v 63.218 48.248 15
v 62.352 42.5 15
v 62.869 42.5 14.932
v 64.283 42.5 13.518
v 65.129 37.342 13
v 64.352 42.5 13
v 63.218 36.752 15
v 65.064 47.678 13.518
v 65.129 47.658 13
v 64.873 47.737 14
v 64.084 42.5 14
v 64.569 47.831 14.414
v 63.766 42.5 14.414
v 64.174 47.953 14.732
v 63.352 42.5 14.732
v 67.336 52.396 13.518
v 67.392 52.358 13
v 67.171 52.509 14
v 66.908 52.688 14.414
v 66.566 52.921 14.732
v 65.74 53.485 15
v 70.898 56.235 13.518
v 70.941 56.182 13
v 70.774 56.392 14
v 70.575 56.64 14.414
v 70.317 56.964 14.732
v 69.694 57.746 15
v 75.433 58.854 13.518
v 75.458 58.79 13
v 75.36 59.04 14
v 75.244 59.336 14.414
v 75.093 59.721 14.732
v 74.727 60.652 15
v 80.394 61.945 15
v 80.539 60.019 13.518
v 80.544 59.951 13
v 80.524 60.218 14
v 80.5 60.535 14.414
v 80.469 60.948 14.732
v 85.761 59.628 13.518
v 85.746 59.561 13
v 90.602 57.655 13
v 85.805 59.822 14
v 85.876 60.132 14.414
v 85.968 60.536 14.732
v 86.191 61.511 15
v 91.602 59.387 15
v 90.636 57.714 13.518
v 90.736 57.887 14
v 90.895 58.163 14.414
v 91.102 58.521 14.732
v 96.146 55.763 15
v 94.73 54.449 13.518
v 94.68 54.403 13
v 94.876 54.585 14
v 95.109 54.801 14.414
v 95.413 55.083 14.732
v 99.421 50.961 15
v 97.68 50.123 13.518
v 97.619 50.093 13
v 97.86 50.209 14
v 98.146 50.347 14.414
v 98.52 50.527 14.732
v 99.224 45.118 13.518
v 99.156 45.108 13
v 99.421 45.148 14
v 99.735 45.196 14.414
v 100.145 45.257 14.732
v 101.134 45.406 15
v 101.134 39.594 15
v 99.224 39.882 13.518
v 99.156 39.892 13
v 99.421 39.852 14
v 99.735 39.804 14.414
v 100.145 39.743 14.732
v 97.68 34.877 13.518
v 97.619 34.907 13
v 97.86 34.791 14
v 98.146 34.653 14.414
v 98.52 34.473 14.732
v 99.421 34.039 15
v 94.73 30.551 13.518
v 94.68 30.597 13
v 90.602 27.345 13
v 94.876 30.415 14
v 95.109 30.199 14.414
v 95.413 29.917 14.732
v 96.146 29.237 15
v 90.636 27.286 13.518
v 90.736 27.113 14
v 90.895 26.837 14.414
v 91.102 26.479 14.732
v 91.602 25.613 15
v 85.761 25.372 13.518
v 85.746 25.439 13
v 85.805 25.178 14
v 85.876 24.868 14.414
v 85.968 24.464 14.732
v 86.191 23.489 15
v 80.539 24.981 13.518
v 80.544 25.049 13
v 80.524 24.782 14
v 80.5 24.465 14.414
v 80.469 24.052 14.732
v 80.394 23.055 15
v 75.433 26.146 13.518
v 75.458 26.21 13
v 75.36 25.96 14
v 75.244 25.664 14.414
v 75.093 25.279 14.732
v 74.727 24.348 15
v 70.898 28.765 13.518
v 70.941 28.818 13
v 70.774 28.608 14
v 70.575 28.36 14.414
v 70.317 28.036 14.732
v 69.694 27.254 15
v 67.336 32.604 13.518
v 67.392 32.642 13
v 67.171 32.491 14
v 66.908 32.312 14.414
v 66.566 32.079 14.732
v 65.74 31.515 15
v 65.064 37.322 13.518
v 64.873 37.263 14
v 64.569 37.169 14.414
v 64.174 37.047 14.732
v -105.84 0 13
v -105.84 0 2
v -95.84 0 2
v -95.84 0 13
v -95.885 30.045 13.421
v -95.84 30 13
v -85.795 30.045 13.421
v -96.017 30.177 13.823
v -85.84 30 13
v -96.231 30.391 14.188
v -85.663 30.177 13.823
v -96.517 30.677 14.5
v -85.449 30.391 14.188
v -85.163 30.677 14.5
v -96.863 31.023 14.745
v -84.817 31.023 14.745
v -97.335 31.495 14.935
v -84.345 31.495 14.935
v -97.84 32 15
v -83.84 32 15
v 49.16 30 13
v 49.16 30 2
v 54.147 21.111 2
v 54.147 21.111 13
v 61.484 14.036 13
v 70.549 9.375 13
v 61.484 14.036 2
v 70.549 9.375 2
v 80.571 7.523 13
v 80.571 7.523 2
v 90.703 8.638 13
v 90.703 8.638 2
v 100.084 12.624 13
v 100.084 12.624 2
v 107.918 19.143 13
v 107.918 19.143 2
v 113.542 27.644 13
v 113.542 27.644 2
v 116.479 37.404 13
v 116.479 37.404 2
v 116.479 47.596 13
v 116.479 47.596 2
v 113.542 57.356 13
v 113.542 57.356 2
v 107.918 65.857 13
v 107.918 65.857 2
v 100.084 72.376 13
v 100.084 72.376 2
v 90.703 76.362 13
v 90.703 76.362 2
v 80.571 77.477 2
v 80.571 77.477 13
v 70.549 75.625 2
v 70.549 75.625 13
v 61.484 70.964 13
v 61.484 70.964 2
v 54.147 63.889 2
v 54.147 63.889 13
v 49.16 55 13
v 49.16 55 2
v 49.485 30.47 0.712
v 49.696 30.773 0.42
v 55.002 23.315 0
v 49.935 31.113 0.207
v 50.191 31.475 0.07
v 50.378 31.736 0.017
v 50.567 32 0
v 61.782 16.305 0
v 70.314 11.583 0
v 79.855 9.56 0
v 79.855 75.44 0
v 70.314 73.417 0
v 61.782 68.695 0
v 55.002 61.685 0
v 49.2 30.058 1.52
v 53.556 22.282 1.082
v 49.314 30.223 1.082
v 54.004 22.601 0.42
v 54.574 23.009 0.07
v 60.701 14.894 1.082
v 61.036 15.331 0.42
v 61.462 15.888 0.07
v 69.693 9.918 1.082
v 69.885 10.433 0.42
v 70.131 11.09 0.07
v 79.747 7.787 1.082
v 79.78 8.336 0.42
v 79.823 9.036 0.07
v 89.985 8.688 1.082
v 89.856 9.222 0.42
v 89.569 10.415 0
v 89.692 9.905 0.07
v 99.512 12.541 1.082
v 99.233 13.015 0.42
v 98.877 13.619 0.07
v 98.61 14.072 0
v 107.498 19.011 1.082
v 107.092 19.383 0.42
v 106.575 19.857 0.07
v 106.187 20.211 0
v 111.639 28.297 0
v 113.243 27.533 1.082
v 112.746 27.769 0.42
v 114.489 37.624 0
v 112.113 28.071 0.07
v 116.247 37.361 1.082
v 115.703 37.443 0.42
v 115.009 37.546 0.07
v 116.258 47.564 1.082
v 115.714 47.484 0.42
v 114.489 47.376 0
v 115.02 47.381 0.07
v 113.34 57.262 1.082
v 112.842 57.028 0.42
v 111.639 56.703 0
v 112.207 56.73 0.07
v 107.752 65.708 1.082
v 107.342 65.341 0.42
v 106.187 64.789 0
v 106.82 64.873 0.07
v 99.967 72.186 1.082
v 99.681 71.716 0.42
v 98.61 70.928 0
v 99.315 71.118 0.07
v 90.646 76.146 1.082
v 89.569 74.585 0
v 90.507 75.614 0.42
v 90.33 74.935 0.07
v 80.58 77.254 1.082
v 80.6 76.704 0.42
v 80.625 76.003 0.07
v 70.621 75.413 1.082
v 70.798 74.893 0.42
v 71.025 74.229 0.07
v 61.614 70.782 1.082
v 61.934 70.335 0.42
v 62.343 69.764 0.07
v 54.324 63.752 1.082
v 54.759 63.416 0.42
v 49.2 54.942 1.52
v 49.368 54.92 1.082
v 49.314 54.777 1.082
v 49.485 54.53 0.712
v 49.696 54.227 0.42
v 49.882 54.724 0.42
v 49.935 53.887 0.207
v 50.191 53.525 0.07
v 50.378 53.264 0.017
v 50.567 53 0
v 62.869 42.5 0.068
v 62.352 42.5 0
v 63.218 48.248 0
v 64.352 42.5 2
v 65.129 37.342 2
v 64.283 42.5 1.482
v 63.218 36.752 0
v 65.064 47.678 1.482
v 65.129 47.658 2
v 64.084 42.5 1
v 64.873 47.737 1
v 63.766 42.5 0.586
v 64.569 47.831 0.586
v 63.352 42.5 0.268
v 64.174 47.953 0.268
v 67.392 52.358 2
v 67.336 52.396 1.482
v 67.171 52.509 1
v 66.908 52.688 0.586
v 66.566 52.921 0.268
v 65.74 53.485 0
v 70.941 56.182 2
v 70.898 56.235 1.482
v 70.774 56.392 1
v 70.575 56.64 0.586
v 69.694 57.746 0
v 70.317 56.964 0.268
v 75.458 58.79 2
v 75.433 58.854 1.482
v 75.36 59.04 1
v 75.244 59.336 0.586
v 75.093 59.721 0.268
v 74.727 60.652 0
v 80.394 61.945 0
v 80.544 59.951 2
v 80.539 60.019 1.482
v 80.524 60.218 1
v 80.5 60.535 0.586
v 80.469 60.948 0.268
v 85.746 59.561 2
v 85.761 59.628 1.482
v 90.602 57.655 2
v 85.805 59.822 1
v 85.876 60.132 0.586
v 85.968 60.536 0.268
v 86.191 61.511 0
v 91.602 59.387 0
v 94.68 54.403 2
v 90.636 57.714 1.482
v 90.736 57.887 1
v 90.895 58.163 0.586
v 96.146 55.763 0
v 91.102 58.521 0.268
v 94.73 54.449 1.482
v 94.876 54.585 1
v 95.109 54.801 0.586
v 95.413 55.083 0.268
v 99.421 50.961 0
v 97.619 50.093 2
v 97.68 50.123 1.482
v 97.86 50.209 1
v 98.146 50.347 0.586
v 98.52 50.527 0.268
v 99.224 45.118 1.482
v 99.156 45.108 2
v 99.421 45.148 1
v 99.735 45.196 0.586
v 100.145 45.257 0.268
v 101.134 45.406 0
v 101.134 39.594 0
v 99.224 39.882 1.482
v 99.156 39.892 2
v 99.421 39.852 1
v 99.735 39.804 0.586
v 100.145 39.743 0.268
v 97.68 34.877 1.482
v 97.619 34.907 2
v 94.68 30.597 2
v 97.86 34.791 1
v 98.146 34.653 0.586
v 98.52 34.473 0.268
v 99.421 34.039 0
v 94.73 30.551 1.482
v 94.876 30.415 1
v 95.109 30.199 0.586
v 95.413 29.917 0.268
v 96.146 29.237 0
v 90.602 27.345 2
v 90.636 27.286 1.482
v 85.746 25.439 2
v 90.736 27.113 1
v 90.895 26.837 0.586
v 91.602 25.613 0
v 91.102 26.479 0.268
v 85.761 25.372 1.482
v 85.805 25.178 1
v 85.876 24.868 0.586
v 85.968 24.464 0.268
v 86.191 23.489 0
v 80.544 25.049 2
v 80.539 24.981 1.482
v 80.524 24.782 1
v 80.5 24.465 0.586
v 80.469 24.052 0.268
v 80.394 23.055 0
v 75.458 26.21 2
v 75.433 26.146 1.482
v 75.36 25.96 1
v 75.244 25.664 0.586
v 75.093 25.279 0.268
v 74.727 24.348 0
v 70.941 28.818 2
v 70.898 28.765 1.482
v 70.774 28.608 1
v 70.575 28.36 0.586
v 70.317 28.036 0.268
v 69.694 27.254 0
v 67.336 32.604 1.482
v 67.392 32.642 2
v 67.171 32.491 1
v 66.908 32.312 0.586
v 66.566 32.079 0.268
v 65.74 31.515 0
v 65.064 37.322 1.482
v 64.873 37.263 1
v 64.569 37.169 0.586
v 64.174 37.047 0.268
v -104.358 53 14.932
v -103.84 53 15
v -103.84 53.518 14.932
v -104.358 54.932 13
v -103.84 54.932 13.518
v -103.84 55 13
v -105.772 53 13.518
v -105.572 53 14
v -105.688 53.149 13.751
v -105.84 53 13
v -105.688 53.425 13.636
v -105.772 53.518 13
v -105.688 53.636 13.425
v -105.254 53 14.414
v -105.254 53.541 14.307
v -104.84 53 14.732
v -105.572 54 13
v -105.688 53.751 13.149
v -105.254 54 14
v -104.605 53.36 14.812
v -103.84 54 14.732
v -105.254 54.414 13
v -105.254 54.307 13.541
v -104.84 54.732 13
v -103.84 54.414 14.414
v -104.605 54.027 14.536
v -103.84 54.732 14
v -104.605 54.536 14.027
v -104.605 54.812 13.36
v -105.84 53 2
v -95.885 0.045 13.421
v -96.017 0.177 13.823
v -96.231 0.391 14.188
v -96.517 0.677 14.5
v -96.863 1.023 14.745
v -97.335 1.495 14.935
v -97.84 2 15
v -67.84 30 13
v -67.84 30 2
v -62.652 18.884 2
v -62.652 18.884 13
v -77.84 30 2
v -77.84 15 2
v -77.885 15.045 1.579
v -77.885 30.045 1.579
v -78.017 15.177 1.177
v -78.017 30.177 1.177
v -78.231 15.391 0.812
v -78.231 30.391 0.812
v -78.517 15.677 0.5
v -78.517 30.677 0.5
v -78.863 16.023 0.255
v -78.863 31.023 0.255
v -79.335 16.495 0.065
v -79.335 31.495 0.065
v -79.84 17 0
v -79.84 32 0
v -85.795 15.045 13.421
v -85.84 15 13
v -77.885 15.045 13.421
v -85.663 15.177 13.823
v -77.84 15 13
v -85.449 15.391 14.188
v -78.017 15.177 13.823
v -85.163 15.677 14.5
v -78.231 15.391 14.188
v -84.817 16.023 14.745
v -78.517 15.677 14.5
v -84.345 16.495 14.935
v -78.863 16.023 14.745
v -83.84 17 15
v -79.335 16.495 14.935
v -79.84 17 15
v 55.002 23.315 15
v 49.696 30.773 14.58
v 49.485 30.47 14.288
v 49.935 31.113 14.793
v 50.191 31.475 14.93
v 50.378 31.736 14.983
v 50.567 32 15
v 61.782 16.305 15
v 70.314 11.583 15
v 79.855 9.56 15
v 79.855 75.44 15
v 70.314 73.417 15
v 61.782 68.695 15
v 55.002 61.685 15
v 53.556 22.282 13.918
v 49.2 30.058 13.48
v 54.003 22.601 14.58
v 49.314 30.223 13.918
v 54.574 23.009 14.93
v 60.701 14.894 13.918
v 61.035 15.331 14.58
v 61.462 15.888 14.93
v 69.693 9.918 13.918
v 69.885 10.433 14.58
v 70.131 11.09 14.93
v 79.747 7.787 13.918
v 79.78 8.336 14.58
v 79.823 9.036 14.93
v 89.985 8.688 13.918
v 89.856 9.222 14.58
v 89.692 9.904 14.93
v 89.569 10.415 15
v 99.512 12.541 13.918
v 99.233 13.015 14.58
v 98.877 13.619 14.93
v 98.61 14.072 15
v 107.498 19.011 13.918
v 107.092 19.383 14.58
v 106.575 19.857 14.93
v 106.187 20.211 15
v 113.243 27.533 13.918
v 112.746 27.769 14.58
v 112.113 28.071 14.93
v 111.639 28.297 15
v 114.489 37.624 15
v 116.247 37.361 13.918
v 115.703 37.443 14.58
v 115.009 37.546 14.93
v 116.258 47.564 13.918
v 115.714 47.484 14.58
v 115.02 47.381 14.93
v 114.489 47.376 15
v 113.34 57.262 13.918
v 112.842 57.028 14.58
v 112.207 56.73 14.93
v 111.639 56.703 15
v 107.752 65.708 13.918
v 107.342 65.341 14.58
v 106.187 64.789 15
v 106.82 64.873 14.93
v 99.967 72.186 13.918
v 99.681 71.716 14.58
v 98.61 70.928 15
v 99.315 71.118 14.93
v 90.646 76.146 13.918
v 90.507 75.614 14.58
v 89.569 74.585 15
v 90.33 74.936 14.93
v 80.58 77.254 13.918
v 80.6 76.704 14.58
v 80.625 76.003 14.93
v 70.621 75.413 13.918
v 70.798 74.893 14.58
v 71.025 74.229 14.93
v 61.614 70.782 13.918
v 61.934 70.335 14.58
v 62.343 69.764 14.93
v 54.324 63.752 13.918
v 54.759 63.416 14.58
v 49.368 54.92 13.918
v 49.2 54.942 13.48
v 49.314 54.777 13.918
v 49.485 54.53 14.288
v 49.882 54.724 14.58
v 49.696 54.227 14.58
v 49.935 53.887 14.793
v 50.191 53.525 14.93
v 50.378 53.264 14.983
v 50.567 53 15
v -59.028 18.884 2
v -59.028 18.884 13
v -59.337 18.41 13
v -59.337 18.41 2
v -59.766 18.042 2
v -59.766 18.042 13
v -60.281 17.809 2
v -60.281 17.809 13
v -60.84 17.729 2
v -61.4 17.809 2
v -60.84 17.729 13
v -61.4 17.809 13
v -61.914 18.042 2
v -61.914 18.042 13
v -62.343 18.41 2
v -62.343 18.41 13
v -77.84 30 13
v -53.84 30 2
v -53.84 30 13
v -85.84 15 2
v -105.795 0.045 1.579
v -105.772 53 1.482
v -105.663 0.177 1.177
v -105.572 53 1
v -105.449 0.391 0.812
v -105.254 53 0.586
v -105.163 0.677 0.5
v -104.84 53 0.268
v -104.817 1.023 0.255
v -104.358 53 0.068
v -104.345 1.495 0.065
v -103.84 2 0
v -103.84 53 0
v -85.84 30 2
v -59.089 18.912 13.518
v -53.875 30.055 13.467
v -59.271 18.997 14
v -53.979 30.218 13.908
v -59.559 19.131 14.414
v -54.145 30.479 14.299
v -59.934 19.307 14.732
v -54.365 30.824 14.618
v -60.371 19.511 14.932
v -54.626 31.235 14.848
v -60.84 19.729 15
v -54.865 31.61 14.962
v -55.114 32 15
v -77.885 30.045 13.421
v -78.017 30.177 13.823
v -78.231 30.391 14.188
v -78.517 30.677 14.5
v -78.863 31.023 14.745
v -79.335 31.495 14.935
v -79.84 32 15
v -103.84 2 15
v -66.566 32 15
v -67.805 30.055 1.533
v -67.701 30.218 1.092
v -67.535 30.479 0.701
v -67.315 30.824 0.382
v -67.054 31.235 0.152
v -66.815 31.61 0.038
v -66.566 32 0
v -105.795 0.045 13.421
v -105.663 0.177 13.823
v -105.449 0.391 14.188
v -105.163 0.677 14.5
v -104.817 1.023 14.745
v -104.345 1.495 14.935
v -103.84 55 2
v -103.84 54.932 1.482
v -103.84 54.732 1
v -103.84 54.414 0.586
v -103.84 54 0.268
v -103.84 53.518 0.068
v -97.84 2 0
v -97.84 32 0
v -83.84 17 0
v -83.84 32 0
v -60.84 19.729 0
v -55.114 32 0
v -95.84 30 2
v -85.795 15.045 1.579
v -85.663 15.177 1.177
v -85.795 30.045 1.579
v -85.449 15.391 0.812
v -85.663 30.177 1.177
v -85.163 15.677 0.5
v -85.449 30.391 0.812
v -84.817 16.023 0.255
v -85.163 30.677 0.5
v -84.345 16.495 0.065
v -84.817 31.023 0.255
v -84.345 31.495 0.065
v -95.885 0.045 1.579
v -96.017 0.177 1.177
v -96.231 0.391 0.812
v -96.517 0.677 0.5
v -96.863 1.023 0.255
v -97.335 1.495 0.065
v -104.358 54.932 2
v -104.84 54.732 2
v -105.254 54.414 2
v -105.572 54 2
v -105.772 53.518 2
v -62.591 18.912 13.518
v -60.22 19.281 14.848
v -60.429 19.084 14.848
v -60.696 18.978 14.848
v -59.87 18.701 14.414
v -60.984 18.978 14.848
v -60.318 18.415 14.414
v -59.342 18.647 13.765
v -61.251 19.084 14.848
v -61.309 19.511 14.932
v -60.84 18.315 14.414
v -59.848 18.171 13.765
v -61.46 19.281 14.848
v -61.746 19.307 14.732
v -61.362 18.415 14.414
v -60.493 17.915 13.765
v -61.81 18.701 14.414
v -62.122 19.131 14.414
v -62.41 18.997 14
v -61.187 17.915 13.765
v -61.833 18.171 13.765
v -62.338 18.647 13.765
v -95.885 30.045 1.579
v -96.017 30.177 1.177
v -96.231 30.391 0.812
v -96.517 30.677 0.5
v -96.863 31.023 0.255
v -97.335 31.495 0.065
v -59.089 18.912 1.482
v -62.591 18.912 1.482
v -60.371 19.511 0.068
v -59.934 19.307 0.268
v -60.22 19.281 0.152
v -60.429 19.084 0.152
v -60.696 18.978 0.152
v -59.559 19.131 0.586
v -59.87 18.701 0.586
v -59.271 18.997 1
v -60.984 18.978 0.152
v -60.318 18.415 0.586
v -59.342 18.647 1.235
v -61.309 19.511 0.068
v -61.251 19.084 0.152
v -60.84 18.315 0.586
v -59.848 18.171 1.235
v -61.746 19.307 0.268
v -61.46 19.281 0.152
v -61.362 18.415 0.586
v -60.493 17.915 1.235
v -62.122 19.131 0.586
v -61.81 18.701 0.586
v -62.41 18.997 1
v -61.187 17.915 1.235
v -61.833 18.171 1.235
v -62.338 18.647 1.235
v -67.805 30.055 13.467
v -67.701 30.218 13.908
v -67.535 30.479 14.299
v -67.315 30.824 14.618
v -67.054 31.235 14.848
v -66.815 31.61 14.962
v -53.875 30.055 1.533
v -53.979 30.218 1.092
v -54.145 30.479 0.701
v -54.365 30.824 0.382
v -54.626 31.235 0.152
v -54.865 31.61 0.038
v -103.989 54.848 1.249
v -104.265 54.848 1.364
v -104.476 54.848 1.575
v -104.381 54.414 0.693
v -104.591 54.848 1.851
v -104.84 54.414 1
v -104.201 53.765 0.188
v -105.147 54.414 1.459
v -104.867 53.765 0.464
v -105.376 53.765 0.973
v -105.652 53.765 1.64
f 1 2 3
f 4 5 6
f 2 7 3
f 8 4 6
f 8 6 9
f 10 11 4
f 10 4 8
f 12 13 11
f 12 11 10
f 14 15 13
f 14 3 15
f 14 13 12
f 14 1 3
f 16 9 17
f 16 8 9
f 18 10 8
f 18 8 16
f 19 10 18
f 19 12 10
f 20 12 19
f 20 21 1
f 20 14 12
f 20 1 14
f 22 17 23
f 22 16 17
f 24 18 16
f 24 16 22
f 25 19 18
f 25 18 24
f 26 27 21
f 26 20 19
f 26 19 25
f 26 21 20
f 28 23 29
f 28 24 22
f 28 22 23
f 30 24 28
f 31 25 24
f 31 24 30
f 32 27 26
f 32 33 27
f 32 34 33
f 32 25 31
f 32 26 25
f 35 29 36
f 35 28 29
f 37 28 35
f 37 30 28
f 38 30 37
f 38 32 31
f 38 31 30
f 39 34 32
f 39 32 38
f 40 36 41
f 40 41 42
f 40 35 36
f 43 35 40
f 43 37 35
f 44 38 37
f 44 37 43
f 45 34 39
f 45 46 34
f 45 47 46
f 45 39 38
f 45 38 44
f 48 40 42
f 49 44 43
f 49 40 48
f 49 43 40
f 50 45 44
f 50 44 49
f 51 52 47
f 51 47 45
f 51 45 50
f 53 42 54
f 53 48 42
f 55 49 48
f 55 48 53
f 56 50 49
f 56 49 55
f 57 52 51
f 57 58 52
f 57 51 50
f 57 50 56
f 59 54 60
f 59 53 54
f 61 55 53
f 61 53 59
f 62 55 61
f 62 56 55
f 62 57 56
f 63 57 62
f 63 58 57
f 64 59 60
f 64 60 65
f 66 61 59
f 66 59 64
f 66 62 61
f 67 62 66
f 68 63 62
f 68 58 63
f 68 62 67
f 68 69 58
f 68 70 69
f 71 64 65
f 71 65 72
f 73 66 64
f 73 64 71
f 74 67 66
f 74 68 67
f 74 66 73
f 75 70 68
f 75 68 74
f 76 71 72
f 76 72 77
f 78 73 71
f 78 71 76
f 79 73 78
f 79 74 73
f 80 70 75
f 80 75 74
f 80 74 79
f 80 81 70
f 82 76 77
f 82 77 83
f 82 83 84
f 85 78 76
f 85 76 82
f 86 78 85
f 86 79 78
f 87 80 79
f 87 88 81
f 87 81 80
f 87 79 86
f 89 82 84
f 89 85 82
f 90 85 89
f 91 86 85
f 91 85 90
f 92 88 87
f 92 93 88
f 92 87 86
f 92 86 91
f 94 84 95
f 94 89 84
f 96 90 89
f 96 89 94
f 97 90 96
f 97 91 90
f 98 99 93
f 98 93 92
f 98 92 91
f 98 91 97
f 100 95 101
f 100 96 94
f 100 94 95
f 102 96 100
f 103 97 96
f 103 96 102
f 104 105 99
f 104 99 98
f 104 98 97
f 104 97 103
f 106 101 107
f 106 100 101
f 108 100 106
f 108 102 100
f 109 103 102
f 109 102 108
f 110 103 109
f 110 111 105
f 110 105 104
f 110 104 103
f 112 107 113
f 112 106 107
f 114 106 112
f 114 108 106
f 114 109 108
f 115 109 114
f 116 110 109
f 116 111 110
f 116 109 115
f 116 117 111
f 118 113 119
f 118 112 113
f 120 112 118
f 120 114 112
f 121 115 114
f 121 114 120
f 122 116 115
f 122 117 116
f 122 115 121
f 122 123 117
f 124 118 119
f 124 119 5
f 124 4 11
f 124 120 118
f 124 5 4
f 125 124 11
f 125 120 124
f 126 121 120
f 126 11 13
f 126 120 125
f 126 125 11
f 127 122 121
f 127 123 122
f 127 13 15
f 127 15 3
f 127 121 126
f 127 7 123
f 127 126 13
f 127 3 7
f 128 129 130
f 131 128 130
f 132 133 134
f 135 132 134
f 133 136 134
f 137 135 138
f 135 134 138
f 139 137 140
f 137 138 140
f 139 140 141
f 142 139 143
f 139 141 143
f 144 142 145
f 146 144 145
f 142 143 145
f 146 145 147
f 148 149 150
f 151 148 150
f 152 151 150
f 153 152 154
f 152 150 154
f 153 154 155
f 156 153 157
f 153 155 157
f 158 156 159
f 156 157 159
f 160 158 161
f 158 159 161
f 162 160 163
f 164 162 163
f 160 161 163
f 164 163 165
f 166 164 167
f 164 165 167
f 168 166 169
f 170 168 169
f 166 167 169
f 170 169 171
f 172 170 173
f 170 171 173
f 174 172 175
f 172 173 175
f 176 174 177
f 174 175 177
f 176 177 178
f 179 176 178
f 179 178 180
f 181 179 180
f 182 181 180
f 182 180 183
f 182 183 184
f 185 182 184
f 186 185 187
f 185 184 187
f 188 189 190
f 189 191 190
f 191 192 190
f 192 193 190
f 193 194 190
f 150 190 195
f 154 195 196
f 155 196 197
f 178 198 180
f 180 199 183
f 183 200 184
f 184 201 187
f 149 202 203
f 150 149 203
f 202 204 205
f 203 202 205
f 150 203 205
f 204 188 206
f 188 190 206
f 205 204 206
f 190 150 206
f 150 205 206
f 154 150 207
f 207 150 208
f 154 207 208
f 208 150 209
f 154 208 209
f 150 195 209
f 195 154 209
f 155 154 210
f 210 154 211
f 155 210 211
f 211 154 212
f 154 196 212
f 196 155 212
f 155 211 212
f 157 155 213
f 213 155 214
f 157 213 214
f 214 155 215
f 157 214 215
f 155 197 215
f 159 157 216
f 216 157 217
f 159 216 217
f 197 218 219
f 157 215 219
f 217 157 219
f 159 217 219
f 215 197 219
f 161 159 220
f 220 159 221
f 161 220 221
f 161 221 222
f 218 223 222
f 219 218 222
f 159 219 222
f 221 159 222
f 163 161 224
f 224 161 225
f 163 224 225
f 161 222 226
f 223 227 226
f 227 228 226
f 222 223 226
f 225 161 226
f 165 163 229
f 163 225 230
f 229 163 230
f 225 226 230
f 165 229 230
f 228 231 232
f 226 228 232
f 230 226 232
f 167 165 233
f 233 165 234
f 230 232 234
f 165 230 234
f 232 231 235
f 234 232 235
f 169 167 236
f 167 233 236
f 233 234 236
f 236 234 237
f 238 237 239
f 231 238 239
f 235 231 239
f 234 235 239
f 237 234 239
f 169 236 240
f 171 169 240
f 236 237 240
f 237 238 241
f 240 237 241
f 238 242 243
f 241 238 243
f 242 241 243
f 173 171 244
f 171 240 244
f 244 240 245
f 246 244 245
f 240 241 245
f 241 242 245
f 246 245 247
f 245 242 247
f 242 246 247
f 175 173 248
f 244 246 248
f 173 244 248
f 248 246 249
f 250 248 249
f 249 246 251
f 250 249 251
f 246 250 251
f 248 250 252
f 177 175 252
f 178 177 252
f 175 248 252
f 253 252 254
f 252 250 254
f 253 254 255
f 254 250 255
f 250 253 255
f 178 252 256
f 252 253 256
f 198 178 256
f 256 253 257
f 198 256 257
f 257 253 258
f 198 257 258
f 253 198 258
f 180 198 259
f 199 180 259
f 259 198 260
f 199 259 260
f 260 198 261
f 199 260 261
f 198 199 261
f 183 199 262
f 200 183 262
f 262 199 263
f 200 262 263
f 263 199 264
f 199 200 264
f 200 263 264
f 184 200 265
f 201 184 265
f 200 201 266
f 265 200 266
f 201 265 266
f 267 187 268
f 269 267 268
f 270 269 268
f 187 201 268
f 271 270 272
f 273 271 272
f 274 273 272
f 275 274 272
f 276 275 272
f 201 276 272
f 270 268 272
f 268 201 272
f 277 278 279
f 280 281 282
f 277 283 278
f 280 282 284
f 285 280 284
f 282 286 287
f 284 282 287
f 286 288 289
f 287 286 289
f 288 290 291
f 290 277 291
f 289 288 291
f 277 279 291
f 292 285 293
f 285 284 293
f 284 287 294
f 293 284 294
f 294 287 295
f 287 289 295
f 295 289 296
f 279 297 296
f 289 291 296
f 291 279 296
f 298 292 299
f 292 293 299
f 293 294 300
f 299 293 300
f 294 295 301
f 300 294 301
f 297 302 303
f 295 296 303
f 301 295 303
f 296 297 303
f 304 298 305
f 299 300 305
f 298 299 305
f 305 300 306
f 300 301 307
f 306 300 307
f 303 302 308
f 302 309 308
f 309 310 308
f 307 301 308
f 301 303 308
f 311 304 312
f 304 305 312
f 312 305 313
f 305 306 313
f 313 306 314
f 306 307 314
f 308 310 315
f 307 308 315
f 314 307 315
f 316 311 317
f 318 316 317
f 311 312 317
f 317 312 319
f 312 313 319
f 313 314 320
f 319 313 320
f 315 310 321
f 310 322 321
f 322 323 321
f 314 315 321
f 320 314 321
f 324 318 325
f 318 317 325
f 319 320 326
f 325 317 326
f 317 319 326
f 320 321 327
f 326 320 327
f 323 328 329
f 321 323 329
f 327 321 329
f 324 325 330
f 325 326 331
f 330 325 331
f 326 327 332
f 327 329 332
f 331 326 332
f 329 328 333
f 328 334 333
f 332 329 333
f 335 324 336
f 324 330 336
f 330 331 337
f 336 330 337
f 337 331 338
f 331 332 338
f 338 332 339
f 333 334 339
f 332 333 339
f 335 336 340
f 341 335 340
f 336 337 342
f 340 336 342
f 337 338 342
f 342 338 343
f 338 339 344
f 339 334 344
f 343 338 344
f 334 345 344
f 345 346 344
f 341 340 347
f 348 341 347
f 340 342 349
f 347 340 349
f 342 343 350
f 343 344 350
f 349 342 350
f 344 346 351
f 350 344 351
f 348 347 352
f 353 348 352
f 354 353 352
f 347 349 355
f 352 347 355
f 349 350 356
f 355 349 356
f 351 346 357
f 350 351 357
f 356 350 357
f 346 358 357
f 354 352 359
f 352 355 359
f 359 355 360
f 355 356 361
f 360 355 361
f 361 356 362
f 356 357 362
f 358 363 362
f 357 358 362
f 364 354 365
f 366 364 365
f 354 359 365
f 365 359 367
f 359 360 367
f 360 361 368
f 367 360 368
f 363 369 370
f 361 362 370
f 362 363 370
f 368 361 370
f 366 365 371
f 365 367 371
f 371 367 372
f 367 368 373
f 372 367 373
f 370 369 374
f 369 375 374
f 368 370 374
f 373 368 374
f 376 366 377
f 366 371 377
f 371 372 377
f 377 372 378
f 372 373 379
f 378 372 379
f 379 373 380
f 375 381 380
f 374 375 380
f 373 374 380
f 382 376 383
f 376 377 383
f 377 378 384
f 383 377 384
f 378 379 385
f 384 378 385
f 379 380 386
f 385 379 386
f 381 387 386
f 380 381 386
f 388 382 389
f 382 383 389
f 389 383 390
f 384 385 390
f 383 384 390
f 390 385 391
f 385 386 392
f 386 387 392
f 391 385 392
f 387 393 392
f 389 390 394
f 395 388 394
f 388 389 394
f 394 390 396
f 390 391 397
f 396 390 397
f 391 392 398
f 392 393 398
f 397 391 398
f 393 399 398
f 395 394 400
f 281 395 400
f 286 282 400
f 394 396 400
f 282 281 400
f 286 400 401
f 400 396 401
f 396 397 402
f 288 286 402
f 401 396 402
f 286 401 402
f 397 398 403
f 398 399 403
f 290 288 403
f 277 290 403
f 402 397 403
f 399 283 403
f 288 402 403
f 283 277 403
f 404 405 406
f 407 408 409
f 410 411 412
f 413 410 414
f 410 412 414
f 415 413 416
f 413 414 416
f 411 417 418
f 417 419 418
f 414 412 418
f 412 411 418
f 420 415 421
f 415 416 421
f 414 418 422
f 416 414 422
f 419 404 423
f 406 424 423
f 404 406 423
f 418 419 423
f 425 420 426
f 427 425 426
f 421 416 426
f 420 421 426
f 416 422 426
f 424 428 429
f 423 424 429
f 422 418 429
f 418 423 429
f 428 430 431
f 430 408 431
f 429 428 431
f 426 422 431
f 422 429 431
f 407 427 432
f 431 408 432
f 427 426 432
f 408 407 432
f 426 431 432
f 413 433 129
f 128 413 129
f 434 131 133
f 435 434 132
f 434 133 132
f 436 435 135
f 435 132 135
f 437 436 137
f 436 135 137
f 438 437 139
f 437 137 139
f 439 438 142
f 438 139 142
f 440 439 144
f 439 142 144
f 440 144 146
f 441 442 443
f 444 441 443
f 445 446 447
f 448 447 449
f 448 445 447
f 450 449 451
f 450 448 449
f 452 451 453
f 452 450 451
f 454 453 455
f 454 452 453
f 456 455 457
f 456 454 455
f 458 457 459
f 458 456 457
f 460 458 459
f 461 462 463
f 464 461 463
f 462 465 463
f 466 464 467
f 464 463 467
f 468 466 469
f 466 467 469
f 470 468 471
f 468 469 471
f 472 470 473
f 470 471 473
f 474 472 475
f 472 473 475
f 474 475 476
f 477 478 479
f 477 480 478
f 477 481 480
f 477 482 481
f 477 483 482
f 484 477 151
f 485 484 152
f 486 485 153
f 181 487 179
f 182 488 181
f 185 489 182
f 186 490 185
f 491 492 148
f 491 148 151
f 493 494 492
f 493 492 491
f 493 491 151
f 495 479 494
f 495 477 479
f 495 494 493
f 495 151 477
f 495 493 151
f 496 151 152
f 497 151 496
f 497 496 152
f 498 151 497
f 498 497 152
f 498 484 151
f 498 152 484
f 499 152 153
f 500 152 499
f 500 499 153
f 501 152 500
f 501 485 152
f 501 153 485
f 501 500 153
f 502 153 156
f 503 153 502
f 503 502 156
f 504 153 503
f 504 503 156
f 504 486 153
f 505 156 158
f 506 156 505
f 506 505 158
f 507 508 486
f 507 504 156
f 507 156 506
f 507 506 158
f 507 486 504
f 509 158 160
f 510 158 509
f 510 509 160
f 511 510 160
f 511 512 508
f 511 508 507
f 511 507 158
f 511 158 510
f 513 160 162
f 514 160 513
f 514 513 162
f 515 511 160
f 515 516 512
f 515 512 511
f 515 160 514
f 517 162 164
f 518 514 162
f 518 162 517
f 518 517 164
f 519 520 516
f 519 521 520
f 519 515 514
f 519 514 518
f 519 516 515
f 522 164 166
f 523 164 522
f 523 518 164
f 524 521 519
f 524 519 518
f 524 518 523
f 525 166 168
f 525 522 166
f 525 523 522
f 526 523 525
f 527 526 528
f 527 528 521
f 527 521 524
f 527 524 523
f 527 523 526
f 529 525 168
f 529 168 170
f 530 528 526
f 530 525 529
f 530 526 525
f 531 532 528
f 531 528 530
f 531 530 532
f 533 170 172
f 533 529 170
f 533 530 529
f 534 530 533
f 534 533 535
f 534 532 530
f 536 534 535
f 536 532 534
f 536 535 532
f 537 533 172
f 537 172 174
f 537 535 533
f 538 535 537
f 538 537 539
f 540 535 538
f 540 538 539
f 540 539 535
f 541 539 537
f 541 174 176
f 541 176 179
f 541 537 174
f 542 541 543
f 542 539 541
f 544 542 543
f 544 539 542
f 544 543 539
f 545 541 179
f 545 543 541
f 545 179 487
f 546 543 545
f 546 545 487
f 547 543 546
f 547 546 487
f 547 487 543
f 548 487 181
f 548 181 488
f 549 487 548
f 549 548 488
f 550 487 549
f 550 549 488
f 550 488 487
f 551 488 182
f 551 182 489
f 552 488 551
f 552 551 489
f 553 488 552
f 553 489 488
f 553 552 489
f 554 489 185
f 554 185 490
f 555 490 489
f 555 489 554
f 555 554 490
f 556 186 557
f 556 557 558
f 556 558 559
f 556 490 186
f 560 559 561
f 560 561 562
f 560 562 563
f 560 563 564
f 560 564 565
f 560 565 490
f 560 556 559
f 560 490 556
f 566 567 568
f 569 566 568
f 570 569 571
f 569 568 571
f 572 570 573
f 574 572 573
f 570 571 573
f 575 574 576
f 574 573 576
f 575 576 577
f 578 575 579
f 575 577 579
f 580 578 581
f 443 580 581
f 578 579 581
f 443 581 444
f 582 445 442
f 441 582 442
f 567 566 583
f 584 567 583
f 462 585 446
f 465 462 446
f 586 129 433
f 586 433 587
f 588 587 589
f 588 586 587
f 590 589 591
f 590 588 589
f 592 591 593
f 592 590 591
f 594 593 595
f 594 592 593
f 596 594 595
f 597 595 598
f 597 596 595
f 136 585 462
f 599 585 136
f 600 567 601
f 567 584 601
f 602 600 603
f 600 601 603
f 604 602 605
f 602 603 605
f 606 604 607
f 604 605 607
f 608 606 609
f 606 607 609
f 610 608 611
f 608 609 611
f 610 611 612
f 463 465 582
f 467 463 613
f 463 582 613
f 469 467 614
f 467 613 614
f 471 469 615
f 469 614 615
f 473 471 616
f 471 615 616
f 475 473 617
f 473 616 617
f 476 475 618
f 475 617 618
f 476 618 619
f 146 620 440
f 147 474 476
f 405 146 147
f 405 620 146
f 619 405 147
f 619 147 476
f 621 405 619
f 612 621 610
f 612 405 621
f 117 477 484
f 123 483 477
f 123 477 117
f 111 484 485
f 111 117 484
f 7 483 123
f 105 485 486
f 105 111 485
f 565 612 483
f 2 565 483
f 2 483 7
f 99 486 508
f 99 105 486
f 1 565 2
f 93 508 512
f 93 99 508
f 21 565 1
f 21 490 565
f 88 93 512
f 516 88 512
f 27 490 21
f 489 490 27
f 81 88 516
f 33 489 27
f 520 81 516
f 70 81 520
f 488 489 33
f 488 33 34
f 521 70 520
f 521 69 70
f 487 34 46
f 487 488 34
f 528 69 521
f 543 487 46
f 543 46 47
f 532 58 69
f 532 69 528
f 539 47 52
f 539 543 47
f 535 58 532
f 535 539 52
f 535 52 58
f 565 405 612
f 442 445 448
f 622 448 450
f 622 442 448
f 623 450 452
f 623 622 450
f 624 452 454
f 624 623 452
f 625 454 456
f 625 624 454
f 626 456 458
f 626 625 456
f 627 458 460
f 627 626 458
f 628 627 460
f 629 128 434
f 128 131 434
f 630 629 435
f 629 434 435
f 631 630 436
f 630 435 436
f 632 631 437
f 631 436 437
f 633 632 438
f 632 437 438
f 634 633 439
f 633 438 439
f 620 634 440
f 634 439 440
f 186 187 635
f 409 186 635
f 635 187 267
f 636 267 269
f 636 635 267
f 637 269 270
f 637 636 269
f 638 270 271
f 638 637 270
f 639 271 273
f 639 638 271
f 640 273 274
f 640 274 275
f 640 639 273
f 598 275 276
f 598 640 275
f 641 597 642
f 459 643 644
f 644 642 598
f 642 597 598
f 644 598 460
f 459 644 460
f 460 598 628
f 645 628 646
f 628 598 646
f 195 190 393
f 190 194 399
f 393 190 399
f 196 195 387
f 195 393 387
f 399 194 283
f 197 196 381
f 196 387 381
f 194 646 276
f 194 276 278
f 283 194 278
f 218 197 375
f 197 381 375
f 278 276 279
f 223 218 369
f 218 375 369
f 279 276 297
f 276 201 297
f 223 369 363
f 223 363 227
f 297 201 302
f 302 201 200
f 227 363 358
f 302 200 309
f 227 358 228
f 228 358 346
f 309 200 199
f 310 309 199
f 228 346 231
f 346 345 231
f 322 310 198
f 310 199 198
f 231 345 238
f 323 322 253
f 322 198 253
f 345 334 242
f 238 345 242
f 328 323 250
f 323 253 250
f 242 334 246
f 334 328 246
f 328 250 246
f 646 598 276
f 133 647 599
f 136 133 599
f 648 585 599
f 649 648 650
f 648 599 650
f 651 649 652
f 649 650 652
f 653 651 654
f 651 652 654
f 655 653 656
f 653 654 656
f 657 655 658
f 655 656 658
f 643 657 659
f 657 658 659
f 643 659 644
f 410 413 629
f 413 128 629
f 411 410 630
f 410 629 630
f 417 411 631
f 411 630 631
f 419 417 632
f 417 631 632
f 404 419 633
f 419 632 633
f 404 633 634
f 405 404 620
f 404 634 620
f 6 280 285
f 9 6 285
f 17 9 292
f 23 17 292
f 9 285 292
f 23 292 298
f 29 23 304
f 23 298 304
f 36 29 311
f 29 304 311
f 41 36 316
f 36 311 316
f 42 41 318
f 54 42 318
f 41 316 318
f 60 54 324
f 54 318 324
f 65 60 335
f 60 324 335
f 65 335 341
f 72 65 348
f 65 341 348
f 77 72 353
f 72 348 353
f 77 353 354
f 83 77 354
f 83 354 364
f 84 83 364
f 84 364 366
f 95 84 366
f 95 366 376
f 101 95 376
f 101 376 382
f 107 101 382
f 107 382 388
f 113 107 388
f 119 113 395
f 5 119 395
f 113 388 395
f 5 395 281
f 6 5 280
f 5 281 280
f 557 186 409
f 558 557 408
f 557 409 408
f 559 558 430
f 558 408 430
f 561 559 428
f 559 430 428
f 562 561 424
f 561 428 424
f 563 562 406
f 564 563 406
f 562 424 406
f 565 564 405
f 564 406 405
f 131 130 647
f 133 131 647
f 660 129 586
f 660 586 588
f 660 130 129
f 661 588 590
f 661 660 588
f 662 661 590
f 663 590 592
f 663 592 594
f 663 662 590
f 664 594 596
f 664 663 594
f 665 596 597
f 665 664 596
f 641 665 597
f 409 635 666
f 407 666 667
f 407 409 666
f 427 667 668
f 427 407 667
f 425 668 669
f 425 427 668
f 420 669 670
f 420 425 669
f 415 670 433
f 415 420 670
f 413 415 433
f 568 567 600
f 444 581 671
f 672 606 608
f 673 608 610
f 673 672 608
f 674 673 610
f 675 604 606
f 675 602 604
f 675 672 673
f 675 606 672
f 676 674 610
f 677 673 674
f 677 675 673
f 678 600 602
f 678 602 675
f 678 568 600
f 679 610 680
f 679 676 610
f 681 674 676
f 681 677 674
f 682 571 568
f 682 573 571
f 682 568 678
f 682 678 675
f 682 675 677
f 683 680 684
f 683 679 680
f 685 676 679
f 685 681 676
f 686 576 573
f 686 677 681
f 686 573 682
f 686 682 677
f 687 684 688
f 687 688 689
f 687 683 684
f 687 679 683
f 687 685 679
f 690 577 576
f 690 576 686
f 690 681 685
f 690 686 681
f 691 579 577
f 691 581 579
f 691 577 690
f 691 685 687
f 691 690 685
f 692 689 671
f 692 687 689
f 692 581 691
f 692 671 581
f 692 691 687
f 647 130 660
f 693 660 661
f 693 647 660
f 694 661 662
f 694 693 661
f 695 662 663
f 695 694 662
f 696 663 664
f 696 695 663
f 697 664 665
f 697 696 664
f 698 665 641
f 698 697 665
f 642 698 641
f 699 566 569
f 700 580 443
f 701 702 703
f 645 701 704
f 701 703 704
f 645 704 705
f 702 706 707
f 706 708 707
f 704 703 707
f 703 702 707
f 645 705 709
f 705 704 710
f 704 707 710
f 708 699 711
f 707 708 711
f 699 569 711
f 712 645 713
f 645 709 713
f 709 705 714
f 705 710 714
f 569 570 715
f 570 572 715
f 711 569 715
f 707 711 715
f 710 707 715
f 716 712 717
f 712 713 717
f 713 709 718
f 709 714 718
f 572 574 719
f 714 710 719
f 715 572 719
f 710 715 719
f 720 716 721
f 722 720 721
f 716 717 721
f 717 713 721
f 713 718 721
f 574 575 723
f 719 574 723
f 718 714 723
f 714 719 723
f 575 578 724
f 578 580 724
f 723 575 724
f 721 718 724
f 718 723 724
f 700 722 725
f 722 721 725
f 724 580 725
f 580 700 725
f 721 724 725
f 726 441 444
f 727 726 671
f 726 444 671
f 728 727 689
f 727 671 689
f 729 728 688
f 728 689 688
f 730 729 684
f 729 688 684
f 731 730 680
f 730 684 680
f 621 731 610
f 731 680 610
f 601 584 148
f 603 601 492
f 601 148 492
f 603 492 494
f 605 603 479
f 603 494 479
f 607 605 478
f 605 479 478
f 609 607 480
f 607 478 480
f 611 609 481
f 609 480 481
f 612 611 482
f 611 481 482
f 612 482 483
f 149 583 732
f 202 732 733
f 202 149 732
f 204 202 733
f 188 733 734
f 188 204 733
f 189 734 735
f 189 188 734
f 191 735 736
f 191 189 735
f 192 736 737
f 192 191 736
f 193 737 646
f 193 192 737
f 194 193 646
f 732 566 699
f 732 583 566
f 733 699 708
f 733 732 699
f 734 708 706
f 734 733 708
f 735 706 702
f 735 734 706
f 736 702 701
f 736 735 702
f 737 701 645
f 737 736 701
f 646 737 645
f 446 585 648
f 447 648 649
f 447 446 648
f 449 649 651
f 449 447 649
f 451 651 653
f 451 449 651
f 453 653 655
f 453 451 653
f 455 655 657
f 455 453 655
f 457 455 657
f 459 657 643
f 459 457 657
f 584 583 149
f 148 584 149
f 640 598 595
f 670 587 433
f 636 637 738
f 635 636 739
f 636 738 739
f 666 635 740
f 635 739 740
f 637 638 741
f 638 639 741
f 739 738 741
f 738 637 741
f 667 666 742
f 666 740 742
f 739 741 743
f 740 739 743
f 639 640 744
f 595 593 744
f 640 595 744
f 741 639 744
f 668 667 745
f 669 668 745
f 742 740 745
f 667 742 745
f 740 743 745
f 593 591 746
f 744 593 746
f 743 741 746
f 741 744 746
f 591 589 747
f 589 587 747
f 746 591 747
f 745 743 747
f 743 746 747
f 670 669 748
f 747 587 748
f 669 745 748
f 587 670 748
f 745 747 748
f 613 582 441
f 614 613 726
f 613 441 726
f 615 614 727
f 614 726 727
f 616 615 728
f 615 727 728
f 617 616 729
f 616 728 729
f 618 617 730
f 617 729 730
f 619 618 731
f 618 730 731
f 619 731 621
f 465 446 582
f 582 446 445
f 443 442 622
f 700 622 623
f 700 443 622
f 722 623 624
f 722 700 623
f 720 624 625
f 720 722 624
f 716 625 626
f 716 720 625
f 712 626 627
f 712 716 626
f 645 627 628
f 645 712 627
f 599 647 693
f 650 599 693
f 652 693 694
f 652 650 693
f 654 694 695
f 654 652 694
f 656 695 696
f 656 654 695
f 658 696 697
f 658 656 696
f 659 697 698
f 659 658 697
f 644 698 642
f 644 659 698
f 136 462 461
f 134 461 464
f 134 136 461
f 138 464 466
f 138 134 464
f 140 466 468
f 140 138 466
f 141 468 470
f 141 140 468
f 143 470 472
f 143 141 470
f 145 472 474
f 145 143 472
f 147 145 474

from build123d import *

# Parameters (mm, degrees)
F0_W     = 10
F0_H     = 30
F0_W_2   = 8
F0_H_2   = 15
F1_DEPTH = 15
F2_R     = 2


# Not quite as in the source:
# - a feature of the source that left no trace in its solid (it failed there, or was rolled back) is left out


with BuildPart() as f1:
    # F0 (on Top) → F1 (new body)
    with BuildSketch(Plane.XY):
        Polygon((-60.840103223, 15), (-53.840103223, 30), (-67.840103223, 30), align=None)
        with Locations((-100.840103223, 15)):
            Rectangle(F0_W, F0_H)
        with Locations((-81.840103223, 22.5)):
            Rectangle(F0_W_2, F0_H_2)
        with BuildLine():
            ThreePointArc((49.159896777, 30), (116.8516388535, 42.5), (49.159896777, 55))
            Line((49.159896777, 55), (49.159896777, 42.5))
            Line((49.159896777, 42.5), (49.159896777, 30))
        make_face()
        with BuildLine():
            ThreePointArc((99.3516388535, 42.5), (81.8516388535, 25), (64.3516388535, 42.5))
            ThreePointArc((64.3516388535, 42.5), (81.8516388535, 60), (99.3516388535, 42.5))
        make_face(mode=Mode.SUBTRACT)
        Polygon((33.3130955696, 42.5), (-105.840103223, 42.5), (-105.840103223, 30), (-95.840103223, 30), (-85.840103223, 30), (-77.840103223, 30), (-67.840103223, 30), (-53.840103223, 30), (49.159896777, 30), (49.159896777, 42.5), align=None)
        Polygon((49.159896777, 55), (-105.840103223, 55), (-105.840103223, 42.5), (33.3130955696, 42.5), (49.159896777, 42.5), align=None)
    extrude(amount=F1_DEPTH)

    # F2
    f2_edges = [f1.edges().sort_by_distance(p)[0] for p in [
        (-28.340103, 55, 15),
        (-100.840103, 0, 15),
        (-105.840103, 27.5, 15),
        (-90.840103, 30, 15),
        (-95.840103, 15, 15),
        (-85.840103, 22.5, 15),
        (-81.840103, 15, 15),
        (-77.840103, 22.5, 15),
        (-72.840103, 30, 15),
        (-64.340103, 22.5, 15),
        (-2.340103, 30, 15),
        (116.851639, 42.5, 15),
        (99.351639, 42.5, 15),
        (-57.340103, 22.5, 0),
        (-105.840103, 27.5, 0),
        (116.851639, 42.5, 0),
        (-2.340103, 30, 0),
        (-81.840103, 15, 0),
        (-77.840103, 22.5, 0),
        (-95.840103, 15, 0),
        (-100.840103, 0, 0),
        (99.351639, 42.5, 0),
        (-28.340103, 55, 0),
        (-105.840103, 55, 7.5),
        (-64.340103, 22.5, 0),
        (-60.840103, 15, 7.5),
        (-57.340103, 22.5, 15),
        (-90.840103, 30, 0),
        (-85.840103, 22.5, 0),
        (-72.840103, 30, 0),
    ]]
    fillet(f2_edges, radius=F2_R)


solid = f1.part
